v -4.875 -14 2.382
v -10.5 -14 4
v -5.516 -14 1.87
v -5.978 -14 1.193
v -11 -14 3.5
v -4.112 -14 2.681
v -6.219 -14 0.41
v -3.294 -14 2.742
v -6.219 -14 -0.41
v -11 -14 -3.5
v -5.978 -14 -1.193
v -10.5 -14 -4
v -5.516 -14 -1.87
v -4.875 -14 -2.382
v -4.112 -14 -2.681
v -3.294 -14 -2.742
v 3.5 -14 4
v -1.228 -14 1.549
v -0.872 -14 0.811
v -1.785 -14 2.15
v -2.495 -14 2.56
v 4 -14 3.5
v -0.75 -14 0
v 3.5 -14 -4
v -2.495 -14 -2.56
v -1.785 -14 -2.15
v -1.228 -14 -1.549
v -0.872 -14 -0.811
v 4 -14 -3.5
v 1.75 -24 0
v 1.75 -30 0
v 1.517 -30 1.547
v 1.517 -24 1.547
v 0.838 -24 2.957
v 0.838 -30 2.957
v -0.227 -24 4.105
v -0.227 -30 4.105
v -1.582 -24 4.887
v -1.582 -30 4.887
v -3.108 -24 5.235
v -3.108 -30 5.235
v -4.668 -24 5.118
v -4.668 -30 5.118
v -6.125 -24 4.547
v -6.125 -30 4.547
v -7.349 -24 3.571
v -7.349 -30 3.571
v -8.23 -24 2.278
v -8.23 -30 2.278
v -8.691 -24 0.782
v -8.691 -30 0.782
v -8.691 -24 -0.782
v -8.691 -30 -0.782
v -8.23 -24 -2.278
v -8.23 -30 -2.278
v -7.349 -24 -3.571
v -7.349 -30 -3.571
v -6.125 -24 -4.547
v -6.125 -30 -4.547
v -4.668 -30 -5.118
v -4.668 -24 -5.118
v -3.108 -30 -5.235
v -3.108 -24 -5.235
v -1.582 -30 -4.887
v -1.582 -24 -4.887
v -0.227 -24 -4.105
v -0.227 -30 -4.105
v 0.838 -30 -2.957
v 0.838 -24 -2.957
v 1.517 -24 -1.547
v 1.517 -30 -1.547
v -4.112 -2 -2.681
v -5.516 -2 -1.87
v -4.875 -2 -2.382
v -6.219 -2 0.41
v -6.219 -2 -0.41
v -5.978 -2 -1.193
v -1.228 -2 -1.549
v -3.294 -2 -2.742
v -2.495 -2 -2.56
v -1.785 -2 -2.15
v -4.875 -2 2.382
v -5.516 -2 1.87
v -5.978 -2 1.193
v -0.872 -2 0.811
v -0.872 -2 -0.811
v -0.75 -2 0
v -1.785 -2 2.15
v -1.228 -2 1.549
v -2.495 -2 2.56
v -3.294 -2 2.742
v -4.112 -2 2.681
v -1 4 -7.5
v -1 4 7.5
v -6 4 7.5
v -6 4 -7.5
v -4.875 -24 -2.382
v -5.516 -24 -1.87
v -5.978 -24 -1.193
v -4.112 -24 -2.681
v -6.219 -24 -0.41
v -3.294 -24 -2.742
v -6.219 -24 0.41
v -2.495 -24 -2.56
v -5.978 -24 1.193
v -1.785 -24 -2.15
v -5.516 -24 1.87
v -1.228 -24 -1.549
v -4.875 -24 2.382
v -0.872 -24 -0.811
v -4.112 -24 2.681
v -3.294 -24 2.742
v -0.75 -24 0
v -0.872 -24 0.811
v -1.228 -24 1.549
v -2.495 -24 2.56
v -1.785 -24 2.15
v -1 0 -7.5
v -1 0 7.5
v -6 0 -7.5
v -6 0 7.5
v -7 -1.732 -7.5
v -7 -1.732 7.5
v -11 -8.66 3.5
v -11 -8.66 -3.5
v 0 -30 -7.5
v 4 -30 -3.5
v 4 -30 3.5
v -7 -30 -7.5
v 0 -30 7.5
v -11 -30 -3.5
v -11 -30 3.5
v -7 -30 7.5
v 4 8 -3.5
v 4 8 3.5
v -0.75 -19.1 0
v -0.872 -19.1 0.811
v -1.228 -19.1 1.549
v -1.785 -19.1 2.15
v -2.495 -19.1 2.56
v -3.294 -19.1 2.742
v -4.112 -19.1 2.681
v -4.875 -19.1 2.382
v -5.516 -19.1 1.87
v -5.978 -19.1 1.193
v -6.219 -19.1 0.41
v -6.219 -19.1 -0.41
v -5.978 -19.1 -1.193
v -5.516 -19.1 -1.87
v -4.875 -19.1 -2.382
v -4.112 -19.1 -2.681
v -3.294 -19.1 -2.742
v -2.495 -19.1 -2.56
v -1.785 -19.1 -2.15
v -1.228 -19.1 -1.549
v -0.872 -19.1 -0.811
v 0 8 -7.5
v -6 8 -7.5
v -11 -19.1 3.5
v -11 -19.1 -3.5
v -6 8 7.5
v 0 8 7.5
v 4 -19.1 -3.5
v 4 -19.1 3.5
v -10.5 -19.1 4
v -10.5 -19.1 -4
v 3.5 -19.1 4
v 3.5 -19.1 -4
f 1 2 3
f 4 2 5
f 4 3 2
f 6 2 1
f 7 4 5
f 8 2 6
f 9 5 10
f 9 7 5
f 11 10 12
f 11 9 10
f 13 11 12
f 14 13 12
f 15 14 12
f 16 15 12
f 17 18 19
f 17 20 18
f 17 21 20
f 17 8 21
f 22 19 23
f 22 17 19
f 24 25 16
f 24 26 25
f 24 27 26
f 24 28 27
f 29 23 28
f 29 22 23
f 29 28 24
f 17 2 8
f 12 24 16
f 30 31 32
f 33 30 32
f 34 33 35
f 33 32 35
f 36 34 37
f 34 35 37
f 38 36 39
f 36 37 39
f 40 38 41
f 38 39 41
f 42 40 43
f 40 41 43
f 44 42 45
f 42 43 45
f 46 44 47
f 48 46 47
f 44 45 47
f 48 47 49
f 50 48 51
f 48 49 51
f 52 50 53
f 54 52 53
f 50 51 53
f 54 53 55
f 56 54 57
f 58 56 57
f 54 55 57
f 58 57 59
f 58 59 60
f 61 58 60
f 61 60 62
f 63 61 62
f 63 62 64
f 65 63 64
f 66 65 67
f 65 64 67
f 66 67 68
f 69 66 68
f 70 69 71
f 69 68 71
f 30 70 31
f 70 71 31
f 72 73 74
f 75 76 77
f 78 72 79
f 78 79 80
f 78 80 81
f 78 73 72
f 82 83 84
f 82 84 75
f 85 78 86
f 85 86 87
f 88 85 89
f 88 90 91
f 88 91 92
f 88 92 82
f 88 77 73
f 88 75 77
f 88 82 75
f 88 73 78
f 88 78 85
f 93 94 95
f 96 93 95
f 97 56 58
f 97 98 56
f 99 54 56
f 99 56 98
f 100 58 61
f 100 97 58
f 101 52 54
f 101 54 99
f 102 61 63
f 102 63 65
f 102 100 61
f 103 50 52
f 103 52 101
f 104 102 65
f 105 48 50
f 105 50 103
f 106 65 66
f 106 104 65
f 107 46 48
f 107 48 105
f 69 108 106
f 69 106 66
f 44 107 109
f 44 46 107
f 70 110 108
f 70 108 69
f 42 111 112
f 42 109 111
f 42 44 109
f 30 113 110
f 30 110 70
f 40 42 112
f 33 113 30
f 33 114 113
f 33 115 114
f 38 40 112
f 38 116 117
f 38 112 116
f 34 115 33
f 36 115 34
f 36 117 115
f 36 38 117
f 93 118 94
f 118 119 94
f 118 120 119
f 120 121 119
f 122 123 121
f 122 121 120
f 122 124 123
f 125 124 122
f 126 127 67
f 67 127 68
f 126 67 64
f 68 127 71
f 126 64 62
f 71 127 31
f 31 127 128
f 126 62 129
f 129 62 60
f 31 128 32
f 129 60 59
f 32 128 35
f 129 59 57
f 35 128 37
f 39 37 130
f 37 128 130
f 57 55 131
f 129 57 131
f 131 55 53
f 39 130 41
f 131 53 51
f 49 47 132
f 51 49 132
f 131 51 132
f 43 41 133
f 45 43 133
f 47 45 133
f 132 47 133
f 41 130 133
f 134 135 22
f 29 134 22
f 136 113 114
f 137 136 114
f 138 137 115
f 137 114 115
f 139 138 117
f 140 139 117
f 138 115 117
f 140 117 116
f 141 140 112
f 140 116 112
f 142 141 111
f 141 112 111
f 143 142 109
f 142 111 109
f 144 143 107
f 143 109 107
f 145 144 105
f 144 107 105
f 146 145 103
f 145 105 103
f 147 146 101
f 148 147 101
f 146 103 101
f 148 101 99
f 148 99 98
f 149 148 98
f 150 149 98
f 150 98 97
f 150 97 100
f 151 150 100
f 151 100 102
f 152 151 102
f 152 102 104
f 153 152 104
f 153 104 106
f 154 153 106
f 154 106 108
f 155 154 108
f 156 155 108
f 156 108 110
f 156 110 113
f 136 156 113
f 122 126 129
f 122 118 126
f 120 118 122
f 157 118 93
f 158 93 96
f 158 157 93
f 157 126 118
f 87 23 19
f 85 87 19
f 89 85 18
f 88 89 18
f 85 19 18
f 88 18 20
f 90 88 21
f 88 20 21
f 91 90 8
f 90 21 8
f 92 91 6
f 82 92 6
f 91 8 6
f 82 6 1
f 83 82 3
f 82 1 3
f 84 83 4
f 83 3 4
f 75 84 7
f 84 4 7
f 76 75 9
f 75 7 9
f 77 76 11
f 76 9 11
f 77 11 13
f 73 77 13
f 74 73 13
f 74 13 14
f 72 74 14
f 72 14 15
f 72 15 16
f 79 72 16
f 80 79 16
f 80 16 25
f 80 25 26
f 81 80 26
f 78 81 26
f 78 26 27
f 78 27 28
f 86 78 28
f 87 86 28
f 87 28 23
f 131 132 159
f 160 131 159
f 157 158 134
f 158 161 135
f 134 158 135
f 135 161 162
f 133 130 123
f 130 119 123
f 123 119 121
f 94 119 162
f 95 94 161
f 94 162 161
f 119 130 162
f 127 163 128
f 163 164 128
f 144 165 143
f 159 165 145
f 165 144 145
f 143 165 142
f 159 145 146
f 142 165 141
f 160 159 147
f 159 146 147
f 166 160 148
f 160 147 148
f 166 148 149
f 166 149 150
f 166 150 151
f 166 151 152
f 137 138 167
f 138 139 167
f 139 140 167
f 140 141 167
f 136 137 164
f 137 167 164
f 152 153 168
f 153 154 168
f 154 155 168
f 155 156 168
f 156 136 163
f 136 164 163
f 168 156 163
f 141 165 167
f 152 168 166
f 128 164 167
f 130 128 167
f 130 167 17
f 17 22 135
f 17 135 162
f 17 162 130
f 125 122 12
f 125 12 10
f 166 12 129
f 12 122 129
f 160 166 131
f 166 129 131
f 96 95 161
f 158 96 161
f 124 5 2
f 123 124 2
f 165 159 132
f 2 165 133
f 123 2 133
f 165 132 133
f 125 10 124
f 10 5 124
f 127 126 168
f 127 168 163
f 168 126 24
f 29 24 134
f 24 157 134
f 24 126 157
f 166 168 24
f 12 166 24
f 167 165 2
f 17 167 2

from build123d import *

# Parameters (mm, degrees)
BOSS_EXTRUDE1_DEPTH = 7.5
SKETCH2_R           = 5.25
CUT_EXTRUDE1_DEPTH  = 6
SKETCH4_R           = 2.75
CUT_EXTRUDE3_DEPTH  = 28
CUT_EXTRUDE4_REACH  = 36.369
SKETCH5_W           = 8
SKETCH5_H           = 5.1
CHAMFER2_SIZE       = 5
CHAMFER2_SIZE2      = 8.660254038
CHAMFER3_SIZE       = 4


with BuildPart() as part:
    # Sketch1 → Boss-Extrude1 (new, symmetric)
    with BuildSketch(Plane.XY):
        Polygon((-6, 8), (4, 8), (4, -30), (-11, -30), (-11, 0), (-1, 0), (-1, 4), (-6, 4), align=None)
    extrude(amount=BOSS_EXTRUDE1_DEPTH, both=True)

    # Sketch2 → Cut-Extrude1 (cut)
    with BuildSketch(Plane.XZ.offset(30)):
        with Locations((-3.5, 0)):
            Circle(SKETCH2_R)
    extrude(amount=-CUT_EXTRUDE1_DEPTH, mode=Mode.SUBTRACT)

    # Sketch4 → Cut-Extrude3 (cut)
    with BuildSketch(Plane.XZ.offset(30)):
        with Locations((-3.5, 0)):
            Circle(SKETCH4_R)
    extrude(amount=-CUT_EXTRUDE3_DEPTH, mode=Mode.SUBTRACT)

    # Sketch5 → Cut-Extrude4 (cut, up to next)
    with BuildSketch(Plane(origin=(4, 0, 0), x_dir=(0, 0, -1), z_dir=(1, 0, 0)), mode=Mode.PRIVATE) as cut_extrude4_sk1:
        with Locations((0, -16.55)):
            Rectangle(SKETCH5_W, SKETCH5_H)
    cut_extrude4_tool1 = extrude(cut_extrude4_sk1.sketch, amount=-CUT_EXTRUDE4_REACH, mode=Mode.PRIVATE) & part.part
    add(cut_extrude4_tool1.solids().sort_by_distance((4, -16.55, 0))[0], mode=Mode.SUBTRACT)

    # Chamfer2
    chamfer2_edges = [part.edges().sort_by_distance(p)[0] for p in [
        (-11, 0, 0),
    ]]
    chamfer2_side = [part.faces().sort_by_distance(p)[0] for p in [
        (-6, 0, 0),
    ]]
    chamfer(chamfer2_edges, length=CHAMFER2_SIZE, length2=CHAMFER2_SIZE2, reference=chamfer2_side[0])

    # Chamfer3
    # the kernel refuses this chamfer: 4 mm, written as the material it takes off along each edge
    with BuildSketch(Plane(origin=(-11, -40.286731952, 7.5), x_dir=(-0.027495876610586487, 0, -0.9996219169112968), z_dir=(0, 1, 0)), Plane(origin=(-11, -40.286731952, -7.5), x_dir=(0.9996219169112968, 0, -0.027495876610586275), z_dir=(0, 1, 0))) as chamfer3_piece_1:
        Polygon((CHAMFER3_SIZE * 0.999621916911, -CHAMFER3_SIZE * 0.0274958766106), (-CHAMFER3_SIZE * 0.0274958766106, -CHAMFER3_SIZE * 0.999621916911), (0, 0), align=None)
    extrude(amount=41.913209866, mode=Mode.SUBTRACT)
    with BuildSketch(Plane(origin=(4, 18.286731952, -7.5), x_dir=(-0.9996219169112968, 0, -0.027495876610586275), z_dir=(0, -1, 0)), Plane(origin=(4, 18.286731952, 7.5), x_dir=(0.02749587661058638, 0, -0.9996219169112968), z_dir=(0, -1, 0))) as chamfer3_piece_2:
        Polygon((CHAMFER3_SIZE * 0.999621916911, -CHAMFER3_SIZE * 0.0274958766106), (-CHAMFER3_SIZE * 0.0274958766106, -CHAMFER3_SIZE * 0.999621916911), (0, 0), align=None)
    extrude(amount=58.573463904, mode=Mode.SUBTRACT)


solid = part.part
